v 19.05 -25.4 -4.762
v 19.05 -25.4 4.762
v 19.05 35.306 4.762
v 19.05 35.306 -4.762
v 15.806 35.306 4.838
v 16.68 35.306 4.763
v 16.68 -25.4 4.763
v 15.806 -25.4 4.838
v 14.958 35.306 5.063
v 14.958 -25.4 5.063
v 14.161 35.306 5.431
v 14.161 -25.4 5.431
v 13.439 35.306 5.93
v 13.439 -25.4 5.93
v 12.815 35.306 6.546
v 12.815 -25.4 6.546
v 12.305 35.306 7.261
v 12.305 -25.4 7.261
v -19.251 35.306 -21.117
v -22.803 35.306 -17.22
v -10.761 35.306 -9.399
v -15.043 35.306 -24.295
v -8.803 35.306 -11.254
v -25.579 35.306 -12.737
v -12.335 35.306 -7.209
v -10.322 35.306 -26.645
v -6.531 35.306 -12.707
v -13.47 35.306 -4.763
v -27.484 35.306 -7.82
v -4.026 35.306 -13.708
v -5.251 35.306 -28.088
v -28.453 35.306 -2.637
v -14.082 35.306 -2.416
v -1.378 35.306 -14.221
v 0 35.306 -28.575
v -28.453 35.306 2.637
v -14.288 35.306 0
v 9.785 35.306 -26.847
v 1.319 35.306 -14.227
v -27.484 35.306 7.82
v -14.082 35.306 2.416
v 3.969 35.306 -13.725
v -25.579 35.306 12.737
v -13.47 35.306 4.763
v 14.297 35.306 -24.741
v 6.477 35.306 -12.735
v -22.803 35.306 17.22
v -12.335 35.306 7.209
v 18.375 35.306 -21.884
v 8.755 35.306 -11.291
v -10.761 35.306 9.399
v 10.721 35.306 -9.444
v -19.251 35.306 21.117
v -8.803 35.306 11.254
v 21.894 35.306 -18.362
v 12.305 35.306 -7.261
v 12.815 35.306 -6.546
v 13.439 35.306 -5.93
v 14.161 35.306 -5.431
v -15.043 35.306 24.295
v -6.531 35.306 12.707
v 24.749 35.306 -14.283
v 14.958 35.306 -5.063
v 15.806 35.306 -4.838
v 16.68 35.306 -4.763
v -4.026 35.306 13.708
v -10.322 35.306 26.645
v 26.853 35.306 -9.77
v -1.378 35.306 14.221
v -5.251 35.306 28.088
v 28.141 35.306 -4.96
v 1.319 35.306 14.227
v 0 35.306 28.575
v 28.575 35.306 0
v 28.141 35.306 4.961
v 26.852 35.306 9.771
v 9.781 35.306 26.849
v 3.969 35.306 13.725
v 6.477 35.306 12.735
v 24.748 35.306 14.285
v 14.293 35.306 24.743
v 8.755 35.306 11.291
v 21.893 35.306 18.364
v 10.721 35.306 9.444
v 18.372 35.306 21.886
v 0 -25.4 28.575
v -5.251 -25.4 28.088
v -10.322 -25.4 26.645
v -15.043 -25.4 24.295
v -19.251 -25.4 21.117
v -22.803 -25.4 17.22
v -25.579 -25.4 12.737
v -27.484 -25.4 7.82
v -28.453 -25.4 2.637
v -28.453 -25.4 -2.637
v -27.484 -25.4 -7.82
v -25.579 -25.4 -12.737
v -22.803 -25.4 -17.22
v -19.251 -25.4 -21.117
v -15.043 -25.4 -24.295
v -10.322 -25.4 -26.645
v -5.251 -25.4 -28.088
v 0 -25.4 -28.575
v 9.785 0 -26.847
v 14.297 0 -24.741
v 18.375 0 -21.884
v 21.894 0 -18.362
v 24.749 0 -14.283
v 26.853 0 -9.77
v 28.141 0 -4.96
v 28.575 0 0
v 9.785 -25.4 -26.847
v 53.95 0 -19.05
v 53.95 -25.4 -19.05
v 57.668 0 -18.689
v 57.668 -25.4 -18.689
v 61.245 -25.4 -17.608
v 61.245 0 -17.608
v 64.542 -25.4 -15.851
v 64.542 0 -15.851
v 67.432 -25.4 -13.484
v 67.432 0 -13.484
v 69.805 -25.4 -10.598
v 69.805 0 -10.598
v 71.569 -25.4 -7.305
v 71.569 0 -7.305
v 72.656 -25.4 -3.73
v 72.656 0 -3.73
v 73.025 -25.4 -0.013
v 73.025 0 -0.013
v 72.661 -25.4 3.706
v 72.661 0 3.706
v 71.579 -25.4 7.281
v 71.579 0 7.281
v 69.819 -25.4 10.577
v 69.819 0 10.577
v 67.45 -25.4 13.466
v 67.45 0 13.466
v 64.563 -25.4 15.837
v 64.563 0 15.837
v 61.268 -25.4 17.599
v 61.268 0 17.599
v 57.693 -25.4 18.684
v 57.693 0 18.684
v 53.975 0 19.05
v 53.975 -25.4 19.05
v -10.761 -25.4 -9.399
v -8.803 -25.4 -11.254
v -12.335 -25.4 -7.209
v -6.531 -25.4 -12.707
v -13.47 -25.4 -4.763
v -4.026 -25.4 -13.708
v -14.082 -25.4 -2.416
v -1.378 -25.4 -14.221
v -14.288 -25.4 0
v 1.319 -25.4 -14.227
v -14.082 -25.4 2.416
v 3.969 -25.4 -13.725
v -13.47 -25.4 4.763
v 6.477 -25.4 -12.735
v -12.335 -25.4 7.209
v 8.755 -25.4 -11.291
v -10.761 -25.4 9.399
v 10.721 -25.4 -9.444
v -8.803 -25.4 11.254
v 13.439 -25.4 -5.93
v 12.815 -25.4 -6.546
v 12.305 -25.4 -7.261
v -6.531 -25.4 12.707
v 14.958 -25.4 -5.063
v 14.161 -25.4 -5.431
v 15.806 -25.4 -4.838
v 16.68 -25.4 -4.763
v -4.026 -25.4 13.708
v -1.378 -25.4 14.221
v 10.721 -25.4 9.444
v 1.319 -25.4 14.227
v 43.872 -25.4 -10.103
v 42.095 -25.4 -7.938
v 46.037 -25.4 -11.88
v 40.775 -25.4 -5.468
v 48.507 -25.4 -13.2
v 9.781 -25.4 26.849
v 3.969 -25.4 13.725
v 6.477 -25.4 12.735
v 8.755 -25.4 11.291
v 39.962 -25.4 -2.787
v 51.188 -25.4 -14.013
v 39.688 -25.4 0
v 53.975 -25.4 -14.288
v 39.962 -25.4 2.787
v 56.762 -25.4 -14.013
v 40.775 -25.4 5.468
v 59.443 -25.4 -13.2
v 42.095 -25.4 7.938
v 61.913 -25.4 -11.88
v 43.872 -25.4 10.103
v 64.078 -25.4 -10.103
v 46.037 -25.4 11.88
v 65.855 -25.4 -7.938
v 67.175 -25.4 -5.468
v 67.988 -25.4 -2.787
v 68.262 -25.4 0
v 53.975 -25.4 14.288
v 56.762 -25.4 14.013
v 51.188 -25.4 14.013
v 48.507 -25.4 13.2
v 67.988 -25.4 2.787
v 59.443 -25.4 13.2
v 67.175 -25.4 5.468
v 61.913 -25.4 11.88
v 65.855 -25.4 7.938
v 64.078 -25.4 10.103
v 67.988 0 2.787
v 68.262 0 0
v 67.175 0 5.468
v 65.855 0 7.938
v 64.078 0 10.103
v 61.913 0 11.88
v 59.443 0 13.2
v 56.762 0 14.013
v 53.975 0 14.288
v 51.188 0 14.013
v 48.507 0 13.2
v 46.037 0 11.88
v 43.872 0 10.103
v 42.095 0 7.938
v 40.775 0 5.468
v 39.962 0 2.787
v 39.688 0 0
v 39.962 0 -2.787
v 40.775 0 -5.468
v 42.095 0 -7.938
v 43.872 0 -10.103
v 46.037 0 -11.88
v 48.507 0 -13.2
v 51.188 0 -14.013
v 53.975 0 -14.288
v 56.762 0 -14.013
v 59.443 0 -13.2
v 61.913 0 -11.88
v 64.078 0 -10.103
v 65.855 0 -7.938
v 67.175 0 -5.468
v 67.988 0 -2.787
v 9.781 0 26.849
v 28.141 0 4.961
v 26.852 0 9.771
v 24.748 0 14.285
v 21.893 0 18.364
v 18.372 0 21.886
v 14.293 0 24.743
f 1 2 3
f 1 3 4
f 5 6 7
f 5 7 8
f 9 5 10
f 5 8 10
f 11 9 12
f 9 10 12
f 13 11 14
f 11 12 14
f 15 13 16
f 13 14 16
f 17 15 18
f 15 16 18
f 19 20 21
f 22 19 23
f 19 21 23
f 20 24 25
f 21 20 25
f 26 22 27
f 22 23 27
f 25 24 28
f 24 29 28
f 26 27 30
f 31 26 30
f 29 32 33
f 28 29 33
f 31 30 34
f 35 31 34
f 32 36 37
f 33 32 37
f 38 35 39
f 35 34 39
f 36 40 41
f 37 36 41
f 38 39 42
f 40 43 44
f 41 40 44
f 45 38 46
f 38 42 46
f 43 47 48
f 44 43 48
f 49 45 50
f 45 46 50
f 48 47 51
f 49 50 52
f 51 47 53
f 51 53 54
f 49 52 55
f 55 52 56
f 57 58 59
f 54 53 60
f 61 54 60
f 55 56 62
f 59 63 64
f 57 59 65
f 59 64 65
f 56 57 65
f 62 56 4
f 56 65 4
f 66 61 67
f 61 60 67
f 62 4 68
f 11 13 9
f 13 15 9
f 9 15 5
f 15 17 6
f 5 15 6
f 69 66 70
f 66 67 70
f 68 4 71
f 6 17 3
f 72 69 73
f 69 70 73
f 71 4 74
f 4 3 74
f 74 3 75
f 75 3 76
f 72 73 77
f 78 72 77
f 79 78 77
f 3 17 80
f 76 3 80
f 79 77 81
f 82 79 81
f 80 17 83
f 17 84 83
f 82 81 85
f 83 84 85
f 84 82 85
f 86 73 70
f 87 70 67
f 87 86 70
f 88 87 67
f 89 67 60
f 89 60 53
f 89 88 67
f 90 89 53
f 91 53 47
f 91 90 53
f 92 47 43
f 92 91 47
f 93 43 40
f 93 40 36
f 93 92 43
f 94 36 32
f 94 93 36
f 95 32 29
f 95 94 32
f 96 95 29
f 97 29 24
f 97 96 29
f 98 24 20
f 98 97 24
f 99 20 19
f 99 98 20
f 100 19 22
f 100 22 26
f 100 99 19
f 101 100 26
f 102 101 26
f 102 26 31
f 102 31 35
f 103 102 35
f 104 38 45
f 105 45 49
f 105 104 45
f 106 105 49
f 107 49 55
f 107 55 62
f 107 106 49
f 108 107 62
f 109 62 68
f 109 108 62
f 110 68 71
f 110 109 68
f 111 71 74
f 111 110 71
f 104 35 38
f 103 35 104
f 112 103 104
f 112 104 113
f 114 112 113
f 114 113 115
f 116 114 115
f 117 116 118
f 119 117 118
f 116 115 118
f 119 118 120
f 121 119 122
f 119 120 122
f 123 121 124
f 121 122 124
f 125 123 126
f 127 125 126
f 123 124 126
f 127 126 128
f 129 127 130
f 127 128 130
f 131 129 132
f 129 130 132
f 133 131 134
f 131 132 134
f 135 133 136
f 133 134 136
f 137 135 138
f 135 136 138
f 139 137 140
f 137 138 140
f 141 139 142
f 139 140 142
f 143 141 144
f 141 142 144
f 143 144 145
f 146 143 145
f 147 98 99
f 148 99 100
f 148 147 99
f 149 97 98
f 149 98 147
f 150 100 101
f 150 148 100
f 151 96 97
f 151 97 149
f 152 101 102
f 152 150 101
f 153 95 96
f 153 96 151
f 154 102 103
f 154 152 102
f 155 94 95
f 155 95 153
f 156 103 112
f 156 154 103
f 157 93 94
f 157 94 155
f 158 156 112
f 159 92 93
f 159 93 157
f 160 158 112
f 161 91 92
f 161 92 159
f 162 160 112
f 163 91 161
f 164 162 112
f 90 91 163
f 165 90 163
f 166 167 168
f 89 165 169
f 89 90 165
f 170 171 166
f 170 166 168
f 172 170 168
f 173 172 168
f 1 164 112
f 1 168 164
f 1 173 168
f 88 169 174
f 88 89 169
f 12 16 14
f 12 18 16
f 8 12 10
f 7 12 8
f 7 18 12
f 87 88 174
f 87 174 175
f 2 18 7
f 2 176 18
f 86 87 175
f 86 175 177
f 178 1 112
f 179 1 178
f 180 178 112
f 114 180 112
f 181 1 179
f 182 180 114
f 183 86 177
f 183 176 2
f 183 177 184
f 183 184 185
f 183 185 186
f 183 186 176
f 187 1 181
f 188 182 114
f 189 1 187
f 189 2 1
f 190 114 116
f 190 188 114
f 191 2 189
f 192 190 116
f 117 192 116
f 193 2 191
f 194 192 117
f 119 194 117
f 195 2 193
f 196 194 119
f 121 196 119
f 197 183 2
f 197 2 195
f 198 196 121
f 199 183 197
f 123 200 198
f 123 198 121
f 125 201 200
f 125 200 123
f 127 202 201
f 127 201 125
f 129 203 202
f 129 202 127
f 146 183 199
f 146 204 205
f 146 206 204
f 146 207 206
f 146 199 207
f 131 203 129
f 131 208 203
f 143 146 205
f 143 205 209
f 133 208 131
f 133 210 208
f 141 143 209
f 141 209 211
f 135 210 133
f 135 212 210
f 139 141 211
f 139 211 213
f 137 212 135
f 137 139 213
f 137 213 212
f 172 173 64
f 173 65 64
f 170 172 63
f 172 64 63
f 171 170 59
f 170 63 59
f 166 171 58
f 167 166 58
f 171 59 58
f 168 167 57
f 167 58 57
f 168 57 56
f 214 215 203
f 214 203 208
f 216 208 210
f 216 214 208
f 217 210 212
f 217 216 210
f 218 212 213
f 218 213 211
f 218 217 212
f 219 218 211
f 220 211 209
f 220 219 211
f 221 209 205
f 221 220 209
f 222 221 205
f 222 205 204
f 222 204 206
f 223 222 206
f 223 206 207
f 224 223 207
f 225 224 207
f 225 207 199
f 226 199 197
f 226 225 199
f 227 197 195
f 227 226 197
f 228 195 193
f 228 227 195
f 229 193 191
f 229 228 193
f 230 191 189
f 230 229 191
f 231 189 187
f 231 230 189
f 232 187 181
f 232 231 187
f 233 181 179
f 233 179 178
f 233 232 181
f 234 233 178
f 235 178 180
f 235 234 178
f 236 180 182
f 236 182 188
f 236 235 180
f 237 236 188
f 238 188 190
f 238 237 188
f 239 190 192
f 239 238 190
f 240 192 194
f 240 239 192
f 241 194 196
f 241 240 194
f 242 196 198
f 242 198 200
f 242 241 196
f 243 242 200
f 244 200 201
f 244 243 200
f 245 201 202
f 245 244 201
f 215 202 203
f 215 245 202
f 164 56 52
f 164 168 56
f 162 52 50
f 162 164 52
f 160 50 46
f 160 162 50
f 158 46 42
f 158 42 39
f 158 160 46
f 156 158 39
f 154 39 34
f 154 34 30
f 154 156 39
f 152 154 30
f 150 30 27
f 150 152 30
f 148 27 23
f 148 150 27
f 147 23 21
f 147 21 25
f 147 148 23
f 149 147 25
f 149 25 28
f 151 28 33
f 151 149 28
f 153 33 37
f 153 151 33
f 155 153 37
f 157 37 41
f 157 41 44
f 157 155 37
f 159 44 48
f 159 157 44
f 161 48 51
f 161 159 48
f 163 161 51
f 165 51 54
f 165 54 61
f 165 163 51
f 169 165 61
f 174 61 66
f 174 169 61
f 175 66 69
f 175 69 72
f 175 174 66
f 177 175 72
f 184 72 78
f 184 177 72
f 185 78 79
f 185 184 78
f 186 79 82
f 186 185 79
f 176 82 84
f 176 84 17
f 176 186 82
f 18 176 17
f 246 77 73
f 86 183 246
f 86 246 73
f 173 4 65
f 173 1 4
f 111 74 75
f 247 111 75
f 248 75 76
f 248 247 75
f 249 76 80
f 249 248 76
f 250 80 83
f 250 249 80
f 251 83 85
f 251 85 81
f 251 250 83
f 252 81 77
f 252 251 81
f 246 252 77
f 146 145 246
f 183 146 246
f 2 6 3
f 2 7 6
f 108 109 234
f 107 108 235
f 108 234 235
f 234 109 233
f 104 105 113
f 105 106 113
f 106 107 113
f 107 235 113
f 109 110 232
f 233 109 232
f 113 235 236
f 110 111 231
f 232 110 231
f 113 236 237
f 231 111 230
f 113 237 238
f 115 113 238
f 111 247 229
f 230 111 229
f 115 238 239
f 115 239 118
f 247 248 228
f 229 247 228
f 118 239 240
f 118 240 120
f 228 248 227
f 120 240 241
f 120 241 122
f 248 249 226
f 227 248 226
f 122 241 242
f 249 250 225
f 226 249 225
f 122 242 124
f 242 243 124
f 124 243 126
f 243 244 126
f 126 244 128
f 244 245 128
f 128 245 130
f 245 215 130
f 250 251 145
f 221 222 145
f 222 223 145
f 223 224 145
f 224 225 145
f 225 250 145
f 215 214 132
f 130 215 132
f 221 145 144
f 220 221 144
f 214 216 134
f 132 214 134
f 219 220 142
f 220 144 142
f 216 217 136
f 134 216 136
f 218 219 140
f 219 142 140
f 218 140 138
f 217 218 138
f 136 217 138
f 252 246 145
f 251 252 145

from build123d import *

# Parameters (mm, degrees)
F0_R     = 14.2875
F1_DEPTH = 25.4
F2_DEPTH = 35.306
F3_R     = 5.08


with BuildPart() as f1:
    # F0 (on Front) → F1 (new body)
    with BuildSketch(Plane.XZ):
        with BuildLine():
            Line((9.780704698, 26.8489932886), (0, 28.575))
            ThreePointArc((0, 28.575), (-28.575, 0), (0, -28.575))
            Line((0, -28.575), (9.7850073358, -26.8474255086))
            ThreePointArc((9.7850073358, -26.8474255086), (23.4108651017, -16.3848106547), (28.575, 0))
            ThreePointArc((28.575, 0), (23.4095521288, 16.3866864902), (9.780704698, 26.8489932886))
        make_face()
        with BuildLine():
            ThreePointArc((-13.4703841816, 4.7625), (0, 14.2875), (13.4703841816, 4.7625))
            Line((13.4703841816, 4.7625), (19.05, 4.7625))
            Line((19.05, 4.7625), (19.05, -4.7625))
            Line((19.05, -4.7625), (13.4703841816, -4.7625))
            ThreePointArc((13.4703841816, -4.7625), (0, -14.2875), (-13.4703841816, -4.7625))
            Line((-13.4703841816, -4.7625), (-19.05, -4.7625))
            Line((-19.05, -4.7625), (-19.05, 4.7625))
            Line((-19.05, 4.7625), (-13.4703841816, 4.7625))
        make_face(mode=Mode.SUBTRACT)
        with BuildLine():
            Line((53.975, 19.05), (9.780704698, 26.8489932886))
            ThreePointArc((9.780704698, 26.8489932886), (23.4095521288, 16.3866864902), (28.575, 0))
            ThreePointArc((28.575, 0), (23.4108651017, -16.3848106547), (9.7850073358, -26.8474255086))
            Line((9.7850073358, -26.8474255086), (53.949834283, -19.0499833776))
            ThreePointArc((53.949834283, -19.0499833776), (34.9250041556, 0.0125828612), (53.975, 19.05))
        make_face()
        with BuildLine():
            ThreePointArc((73.025, 0), (67.4453841816, 13.4703841816), (53.975, 19.05))
            ThreePointArc((53.975, 19.05), (34.9250041556, 0.0125828612), (53.949834283, -19.0499833776))
            ThreePointArc((53.949834283, -19.0499833776), (67.4364838166, -13.4792786697), (73.025, 0))
        make_face()
        with Locations((53.975, 0)):
            Circle(F0_R, mode=Mode.SUBTRACT)
        with BuildLine():
            ThreePointArc((-13.4703841816, -4.7625), (-14.2875, 0), (-13.4703841816, 4.7625))
            Line((-13.4703841816, 4.7625), (-19.05, 4.7625))
            Line((-19.05, 4.7625), (-19.05, -4.7625))
            Line((-19.05, -4.7625), (-13.4703841816, -4.7625))
        make_face()
    extrude(amount=F1_DEPTH)

    # F0 (on Front) → F2 (join)
    with BuildSketch(Plane.XZ):
        with BuildLine():
            Line((9.780704698, 26.8489932886), (0, 28.575))
            ThreePointArc((0, 28.575), (-28.575, 0), (0, -28.575))
            Line((0, -28.575), (9.7850073358, -26.8474255086))
            ThreePointArc((9.7850073358, -26.8474255086), (23.4108651017, -16.3848106547), (28.575, 0))
            ThreePointArc((28.575, 0), (23.4095521288, 16.3866864902), (9.780704698, 26.8489932886))
        make_face()
        with BuildLine():
            ThreePointArc((-13.4703841816, 4.7625), (0, 14.2875), (13.4703841816, 4.7625))
            Line((13.4703841816, 4.7625), (19.05, 4.7625))
            Line((19.05, 4.7625), (19.05, -4.7625))
            Line((19.05, -4.7625), (13.4703841816, -4.7625))
            ThreePointArc((13.4703841816, -4.7625), (0, -14.2875), (-13.4703841816, -4.7625))
            Line((-13.4703841816, -4.7625), (-19.05, -4.7625))
            Line((-19.05, -4.7625), (-19.05, 4.7625))
            Line((-19.05, 4.7625), (-13.4703841816, 4.7625))
        make_face(mode=Mode.SUBTRACT)
        with BuildLine():
            ThreePointArc((-13.4703841816, -4.7625), (-14.2875, 0), (-13.4703841816, 4.7625))
            Line((-13.4703841816, 4.7625), (-19.05, 4.7625))
            Line((-19.05, 4.7625), (-19.05, -4.7625))
            Line((-19.05, -4.7625), (-13.4703841816, -4.7625))
        make_face()
    extrude(amount=-F2_DEPTH)

    # F3
    f3_edges = [f1.edges().sort_by_distance(p)[0] for p in [
        (13.470384, 4.953, -4.7625),
        (13.470384, 4.953, 4.7625),
    ]]
    fillet(f3_edges, radius=F3_R)


solid = f1.part
